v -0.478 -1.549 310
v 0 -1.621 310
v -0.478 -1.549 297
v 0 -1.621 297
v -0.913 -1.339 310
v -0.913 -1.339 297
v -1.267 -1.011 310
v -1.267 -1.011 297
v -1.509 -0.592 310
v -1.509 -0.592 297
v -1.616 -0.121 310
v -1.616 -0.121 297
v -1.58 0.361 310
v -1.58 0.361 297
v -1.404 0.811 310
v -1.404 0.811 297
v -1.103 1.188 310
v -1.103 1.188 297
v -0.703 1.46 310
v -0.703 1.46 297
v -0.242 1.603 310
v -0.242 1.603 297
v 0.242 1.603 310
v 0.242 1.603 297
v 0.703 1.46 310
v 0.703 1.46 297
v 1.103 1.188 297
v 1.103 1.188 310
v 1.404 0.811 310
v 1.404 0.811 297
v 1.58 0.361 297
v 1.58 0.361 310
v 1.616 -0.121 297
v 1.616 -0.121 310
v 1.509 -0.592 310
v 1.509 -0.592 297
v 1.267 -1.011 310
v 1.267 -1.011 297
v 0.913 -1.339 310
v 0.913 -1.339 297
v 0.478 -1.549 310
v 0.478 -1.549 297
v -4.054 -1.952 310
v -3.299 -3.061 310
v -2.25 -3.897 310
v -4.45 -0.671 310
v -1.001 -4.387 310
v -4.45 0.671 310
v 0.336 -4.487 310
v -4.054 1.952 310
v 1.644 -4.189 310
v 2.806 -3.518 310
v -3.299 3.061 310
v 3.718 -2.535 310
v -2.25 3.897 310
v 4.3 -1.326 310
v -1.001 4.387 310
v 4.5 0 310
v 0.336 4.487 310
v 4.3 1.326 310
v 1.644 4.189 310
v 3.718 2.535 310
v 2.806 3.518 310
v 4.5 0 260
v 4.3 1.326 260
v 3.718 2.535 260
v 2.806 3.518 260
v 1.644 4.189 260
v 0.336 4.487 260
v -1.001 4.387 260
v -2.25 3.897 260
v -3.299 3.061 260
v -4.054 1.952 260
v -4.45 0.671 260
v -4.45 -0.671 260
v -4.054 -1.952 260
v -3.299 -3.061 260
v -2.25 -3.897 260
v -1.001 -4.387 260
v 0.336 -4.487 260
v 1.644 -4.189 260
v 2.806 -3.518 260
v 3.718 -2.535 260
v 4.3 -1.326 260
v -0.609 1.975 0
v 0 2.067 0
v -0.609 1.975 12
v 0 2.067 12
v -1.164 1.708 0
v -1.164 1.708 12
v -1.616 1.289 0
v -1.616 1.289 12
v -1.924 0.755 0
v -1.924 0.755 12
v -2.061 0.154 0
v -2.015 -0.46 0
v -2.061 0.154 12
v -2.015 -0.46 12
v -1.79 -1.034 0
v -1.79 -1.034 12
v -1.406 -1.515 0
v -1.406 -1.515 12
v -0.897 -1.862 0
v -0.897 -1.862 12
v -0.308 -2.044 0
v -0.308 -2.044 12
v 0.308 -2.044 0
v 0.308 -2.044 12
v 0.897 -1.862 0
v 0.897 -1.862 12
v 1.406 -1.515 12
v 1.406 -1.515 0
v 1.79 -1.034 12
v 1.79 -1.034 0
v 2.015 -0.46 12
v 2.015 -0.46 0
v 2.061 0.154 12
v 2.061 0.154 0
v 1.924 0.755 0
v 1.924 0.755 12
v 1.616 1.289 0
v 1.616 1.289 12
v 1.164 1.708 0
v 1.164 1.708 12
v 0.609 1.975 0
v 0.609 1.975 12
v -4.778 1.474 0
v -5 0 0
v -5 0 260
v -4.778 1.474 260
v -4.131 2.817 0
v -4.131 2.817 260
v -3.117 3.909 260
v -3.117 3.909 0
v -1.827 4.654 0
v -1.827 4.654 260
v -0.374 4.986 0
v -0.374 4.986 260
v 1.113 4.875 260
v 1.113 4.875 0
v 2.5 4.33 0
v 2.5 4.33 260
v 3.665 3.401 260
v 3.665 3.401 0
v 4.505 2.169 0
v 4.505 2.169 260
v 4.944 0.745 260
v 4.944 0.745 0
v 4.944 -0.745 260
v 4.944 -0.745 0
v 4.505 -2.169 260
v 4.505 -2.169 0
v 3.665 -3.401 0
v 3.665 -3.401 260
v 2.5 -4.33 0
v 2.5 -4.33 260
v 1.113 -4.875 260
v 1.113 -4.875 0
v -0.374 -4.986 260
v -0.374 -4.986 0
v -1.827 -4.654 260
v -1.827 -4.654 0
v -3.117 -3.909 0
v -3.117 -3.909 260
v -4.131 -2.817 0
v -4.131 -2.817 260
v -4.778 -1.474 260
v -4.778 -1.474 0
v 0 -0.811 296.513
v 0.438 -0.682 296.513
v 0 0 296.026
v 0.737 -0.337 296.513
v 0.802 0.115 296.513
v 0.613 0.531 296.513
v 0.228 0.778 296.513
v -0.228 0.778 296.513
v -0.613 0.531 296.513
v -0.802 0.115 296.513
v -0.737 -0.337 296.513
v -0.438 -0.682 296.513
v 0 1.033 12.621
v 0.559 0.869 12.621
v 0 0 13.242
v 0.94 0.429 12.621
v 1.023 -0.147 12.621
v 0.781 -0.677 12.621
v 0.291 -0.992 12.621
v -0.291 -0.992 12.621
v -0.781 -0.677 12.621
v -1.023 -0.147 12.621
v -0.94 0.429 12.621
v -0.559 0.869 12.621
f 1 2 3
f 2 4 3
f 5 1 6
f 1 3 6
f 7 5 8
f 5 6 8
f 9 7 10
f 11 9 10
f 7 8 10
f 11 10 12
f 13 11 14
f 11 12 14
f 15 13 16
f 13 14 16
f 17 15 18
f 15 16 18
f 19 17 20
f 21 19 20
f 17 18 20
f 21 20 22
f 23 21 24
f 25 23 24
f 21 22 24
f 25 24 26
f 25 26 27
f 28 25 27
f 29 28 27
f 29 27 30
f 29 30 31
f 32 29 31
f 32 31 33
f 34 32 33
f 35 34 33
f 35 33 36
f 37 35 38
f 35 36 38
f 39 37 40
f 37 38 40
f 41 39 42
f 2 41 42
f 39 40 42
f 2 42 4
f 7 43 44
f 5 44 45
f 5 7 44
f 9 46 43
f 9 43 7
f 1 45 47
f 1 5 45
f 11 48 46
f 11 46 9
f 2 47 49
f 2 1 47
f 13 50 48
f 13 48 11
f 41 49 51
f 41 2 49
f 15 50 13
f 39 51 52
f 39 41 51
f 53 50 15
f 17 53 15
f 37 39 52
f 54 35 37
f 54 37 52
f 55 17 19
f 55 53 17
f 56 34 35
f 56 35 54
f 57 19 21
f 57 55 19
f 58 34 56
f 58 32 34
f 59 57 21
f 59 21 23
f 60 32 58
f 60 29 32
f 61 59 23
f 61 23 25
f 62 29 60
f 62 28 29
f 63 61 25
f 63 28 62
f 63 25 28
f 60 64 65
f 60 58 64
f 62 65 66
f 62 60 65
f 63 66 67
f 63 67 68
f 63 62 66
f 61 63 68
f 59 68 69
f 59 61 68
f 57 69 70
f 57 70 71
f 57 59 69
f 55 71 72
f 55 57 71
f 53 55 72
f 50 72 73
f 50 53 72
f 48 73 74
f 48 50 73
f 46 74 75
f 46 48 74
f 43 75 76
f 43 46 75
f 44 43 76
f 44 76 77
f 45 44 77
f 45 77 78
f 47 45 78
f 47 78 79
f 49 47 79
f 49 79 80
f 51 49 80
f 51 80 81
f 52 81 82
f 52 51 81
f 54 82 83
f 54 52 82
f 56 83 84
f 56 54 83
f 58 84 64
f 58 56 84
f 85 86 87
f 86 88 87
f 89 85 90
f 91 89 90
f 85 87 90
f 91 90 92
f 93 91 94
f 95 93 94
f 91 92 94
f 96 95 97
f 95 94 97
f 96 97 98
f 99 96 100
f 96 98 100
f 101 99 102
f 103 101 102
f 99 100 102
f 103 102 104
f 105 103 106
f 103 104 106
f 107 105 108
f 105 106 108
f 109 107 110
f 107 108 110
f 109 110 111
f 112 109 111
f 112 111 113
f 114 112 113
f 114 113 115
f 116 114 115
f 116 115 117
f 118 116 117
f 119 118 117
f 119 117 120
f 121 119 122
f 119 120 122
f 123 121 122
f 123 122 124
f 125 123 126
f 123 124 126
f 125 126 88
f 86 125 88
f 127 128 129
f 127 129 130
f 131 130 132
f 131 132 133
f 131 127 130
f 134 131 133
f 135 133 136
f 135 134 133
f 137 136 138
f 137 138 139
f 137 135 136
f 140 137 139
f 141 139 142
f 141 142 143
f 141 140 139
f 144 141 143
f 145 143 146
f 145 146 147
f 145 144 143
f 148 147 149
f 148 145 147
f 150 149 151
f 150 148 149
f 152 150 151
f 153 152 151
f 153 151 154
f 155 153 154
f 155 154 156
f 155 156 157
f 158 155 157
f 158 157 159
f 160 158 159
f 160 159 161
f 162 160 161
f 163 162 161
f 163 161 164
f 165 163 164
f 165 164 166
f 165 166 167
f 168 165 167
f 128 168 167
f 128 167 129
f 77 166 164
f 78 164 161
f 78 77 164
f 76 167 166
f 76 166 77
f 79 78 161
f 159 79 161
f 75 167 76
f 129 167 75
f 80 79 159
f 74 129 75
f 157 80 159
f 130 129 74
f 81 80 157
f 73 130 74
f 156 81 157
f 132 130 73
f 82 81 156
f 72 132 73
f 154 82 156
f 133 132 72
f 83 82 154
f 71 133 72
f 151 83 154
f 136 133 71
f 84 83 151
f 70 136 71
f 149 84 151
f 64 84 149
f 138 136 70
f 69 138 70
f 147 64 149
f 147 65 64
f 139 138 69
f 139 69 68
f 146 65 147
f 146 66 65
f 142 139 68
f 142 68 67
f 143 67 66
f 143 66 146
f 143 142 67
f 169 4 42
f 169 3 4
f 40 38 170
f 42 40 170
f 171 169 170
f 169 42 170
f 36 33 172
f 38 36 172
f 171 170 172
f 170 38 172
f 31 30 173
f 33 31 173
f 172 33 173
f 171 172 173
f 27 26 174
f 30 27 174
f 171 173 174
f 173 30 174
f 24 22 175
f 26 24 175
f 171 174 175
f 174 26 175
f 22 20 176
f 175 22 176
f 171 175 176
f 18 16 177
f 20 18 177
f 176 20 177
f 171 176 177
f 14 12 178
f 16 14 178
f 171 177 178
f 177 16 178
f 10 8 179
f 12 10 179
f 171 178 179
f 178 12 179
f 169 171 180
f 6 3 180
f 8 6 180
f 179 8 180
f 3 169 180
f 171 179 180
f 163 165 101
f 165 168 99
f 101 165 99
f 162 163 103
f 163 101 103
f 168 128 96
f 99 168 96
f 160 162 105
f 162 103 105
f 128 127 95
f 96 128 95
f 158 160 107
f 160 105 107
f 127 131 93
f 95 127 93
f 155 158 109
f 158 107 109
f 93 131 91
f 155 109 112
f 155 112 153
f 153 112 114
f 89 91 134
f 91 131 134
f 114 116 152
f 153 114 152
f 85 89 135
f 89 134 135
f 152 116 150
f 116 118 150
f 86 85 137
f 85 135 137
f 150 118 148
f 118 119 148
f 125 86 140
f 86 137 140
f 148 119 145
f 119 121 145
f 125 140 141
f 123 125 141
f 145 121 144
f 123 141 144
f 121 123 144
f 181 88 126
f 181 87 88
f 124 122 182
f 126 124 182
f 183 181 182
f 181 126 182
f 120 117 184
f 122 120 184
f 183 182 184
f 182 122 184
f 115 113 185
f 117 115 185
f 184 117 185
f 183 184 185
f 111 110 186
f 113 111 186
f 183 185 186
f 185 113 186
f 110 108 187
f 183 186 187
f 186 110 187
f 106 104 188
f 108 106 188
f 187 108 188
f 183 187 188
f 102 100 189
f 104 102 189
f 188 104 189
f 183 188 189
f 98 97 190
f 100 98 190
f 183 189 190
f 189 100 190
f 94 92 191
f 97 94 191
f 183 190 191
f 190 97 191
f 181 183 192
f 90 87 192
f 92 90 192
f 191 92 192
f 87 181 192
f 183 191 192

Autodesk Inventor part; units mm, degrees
ref_plane "YZ Plane" through (0, 0, 0) normal (1, 0, 0) x (0, 1, 0)
ref_plane "XZ Plane" through (0, 0, 0) normal (0, 1, 0) x (-1, 0, 0)
ref_plane "XY Plane" through (0, 0, 0) normal (0, 0, 1) x (1, 0, 0)
sketch "Skizze1" plane through (0, 0, 0) normal (0, 0, 1) x (1, 0, 0)
  circle A0 centre (0, 0) radius 6
  dimension "d0" = 12
extrude "Extrusion1" add sketch "Skizze1" along normal blind 310
sketch "Skizze2" plane through (0, 0, 0) normal (0, 0, -1) x (-1, 0, 0)
  circle A0 centre (0, 0) radius 6 projected
  circle A1 centre (0, 0) radius 5
  dimension "d3" = 10
extrude "Extrusion2" cut sketch "Skizze2" against normal through all
sketch "Skizze3" plane through (0, 0, 310) normal (0, 0, 1) x (1, 0, 0)
  circle A0 centre (0, 0) radius 5 projected
  circle A1 centre (0, 0) radius 4.5
  dimension "d6" = 9
extrude "Extrusion3" cut sketch "Skizze3" against normal blind 50
hole "Bohrung1" at (0, 0, 0) direction (0, 0, 1) diameter 4.134 depth 12 tip angle 118 thread size "M5x0.8" class "6H" standard "ISO Metric profile"
hole "Bohrung2" at (0, 0, 310) direction (0, 0, -1) diameter 3.242 depth 13 tip angle 118 thread size "M4x0.7" class "6H" standard "ISO Metric profile"
properties part number "13_0204_022"
